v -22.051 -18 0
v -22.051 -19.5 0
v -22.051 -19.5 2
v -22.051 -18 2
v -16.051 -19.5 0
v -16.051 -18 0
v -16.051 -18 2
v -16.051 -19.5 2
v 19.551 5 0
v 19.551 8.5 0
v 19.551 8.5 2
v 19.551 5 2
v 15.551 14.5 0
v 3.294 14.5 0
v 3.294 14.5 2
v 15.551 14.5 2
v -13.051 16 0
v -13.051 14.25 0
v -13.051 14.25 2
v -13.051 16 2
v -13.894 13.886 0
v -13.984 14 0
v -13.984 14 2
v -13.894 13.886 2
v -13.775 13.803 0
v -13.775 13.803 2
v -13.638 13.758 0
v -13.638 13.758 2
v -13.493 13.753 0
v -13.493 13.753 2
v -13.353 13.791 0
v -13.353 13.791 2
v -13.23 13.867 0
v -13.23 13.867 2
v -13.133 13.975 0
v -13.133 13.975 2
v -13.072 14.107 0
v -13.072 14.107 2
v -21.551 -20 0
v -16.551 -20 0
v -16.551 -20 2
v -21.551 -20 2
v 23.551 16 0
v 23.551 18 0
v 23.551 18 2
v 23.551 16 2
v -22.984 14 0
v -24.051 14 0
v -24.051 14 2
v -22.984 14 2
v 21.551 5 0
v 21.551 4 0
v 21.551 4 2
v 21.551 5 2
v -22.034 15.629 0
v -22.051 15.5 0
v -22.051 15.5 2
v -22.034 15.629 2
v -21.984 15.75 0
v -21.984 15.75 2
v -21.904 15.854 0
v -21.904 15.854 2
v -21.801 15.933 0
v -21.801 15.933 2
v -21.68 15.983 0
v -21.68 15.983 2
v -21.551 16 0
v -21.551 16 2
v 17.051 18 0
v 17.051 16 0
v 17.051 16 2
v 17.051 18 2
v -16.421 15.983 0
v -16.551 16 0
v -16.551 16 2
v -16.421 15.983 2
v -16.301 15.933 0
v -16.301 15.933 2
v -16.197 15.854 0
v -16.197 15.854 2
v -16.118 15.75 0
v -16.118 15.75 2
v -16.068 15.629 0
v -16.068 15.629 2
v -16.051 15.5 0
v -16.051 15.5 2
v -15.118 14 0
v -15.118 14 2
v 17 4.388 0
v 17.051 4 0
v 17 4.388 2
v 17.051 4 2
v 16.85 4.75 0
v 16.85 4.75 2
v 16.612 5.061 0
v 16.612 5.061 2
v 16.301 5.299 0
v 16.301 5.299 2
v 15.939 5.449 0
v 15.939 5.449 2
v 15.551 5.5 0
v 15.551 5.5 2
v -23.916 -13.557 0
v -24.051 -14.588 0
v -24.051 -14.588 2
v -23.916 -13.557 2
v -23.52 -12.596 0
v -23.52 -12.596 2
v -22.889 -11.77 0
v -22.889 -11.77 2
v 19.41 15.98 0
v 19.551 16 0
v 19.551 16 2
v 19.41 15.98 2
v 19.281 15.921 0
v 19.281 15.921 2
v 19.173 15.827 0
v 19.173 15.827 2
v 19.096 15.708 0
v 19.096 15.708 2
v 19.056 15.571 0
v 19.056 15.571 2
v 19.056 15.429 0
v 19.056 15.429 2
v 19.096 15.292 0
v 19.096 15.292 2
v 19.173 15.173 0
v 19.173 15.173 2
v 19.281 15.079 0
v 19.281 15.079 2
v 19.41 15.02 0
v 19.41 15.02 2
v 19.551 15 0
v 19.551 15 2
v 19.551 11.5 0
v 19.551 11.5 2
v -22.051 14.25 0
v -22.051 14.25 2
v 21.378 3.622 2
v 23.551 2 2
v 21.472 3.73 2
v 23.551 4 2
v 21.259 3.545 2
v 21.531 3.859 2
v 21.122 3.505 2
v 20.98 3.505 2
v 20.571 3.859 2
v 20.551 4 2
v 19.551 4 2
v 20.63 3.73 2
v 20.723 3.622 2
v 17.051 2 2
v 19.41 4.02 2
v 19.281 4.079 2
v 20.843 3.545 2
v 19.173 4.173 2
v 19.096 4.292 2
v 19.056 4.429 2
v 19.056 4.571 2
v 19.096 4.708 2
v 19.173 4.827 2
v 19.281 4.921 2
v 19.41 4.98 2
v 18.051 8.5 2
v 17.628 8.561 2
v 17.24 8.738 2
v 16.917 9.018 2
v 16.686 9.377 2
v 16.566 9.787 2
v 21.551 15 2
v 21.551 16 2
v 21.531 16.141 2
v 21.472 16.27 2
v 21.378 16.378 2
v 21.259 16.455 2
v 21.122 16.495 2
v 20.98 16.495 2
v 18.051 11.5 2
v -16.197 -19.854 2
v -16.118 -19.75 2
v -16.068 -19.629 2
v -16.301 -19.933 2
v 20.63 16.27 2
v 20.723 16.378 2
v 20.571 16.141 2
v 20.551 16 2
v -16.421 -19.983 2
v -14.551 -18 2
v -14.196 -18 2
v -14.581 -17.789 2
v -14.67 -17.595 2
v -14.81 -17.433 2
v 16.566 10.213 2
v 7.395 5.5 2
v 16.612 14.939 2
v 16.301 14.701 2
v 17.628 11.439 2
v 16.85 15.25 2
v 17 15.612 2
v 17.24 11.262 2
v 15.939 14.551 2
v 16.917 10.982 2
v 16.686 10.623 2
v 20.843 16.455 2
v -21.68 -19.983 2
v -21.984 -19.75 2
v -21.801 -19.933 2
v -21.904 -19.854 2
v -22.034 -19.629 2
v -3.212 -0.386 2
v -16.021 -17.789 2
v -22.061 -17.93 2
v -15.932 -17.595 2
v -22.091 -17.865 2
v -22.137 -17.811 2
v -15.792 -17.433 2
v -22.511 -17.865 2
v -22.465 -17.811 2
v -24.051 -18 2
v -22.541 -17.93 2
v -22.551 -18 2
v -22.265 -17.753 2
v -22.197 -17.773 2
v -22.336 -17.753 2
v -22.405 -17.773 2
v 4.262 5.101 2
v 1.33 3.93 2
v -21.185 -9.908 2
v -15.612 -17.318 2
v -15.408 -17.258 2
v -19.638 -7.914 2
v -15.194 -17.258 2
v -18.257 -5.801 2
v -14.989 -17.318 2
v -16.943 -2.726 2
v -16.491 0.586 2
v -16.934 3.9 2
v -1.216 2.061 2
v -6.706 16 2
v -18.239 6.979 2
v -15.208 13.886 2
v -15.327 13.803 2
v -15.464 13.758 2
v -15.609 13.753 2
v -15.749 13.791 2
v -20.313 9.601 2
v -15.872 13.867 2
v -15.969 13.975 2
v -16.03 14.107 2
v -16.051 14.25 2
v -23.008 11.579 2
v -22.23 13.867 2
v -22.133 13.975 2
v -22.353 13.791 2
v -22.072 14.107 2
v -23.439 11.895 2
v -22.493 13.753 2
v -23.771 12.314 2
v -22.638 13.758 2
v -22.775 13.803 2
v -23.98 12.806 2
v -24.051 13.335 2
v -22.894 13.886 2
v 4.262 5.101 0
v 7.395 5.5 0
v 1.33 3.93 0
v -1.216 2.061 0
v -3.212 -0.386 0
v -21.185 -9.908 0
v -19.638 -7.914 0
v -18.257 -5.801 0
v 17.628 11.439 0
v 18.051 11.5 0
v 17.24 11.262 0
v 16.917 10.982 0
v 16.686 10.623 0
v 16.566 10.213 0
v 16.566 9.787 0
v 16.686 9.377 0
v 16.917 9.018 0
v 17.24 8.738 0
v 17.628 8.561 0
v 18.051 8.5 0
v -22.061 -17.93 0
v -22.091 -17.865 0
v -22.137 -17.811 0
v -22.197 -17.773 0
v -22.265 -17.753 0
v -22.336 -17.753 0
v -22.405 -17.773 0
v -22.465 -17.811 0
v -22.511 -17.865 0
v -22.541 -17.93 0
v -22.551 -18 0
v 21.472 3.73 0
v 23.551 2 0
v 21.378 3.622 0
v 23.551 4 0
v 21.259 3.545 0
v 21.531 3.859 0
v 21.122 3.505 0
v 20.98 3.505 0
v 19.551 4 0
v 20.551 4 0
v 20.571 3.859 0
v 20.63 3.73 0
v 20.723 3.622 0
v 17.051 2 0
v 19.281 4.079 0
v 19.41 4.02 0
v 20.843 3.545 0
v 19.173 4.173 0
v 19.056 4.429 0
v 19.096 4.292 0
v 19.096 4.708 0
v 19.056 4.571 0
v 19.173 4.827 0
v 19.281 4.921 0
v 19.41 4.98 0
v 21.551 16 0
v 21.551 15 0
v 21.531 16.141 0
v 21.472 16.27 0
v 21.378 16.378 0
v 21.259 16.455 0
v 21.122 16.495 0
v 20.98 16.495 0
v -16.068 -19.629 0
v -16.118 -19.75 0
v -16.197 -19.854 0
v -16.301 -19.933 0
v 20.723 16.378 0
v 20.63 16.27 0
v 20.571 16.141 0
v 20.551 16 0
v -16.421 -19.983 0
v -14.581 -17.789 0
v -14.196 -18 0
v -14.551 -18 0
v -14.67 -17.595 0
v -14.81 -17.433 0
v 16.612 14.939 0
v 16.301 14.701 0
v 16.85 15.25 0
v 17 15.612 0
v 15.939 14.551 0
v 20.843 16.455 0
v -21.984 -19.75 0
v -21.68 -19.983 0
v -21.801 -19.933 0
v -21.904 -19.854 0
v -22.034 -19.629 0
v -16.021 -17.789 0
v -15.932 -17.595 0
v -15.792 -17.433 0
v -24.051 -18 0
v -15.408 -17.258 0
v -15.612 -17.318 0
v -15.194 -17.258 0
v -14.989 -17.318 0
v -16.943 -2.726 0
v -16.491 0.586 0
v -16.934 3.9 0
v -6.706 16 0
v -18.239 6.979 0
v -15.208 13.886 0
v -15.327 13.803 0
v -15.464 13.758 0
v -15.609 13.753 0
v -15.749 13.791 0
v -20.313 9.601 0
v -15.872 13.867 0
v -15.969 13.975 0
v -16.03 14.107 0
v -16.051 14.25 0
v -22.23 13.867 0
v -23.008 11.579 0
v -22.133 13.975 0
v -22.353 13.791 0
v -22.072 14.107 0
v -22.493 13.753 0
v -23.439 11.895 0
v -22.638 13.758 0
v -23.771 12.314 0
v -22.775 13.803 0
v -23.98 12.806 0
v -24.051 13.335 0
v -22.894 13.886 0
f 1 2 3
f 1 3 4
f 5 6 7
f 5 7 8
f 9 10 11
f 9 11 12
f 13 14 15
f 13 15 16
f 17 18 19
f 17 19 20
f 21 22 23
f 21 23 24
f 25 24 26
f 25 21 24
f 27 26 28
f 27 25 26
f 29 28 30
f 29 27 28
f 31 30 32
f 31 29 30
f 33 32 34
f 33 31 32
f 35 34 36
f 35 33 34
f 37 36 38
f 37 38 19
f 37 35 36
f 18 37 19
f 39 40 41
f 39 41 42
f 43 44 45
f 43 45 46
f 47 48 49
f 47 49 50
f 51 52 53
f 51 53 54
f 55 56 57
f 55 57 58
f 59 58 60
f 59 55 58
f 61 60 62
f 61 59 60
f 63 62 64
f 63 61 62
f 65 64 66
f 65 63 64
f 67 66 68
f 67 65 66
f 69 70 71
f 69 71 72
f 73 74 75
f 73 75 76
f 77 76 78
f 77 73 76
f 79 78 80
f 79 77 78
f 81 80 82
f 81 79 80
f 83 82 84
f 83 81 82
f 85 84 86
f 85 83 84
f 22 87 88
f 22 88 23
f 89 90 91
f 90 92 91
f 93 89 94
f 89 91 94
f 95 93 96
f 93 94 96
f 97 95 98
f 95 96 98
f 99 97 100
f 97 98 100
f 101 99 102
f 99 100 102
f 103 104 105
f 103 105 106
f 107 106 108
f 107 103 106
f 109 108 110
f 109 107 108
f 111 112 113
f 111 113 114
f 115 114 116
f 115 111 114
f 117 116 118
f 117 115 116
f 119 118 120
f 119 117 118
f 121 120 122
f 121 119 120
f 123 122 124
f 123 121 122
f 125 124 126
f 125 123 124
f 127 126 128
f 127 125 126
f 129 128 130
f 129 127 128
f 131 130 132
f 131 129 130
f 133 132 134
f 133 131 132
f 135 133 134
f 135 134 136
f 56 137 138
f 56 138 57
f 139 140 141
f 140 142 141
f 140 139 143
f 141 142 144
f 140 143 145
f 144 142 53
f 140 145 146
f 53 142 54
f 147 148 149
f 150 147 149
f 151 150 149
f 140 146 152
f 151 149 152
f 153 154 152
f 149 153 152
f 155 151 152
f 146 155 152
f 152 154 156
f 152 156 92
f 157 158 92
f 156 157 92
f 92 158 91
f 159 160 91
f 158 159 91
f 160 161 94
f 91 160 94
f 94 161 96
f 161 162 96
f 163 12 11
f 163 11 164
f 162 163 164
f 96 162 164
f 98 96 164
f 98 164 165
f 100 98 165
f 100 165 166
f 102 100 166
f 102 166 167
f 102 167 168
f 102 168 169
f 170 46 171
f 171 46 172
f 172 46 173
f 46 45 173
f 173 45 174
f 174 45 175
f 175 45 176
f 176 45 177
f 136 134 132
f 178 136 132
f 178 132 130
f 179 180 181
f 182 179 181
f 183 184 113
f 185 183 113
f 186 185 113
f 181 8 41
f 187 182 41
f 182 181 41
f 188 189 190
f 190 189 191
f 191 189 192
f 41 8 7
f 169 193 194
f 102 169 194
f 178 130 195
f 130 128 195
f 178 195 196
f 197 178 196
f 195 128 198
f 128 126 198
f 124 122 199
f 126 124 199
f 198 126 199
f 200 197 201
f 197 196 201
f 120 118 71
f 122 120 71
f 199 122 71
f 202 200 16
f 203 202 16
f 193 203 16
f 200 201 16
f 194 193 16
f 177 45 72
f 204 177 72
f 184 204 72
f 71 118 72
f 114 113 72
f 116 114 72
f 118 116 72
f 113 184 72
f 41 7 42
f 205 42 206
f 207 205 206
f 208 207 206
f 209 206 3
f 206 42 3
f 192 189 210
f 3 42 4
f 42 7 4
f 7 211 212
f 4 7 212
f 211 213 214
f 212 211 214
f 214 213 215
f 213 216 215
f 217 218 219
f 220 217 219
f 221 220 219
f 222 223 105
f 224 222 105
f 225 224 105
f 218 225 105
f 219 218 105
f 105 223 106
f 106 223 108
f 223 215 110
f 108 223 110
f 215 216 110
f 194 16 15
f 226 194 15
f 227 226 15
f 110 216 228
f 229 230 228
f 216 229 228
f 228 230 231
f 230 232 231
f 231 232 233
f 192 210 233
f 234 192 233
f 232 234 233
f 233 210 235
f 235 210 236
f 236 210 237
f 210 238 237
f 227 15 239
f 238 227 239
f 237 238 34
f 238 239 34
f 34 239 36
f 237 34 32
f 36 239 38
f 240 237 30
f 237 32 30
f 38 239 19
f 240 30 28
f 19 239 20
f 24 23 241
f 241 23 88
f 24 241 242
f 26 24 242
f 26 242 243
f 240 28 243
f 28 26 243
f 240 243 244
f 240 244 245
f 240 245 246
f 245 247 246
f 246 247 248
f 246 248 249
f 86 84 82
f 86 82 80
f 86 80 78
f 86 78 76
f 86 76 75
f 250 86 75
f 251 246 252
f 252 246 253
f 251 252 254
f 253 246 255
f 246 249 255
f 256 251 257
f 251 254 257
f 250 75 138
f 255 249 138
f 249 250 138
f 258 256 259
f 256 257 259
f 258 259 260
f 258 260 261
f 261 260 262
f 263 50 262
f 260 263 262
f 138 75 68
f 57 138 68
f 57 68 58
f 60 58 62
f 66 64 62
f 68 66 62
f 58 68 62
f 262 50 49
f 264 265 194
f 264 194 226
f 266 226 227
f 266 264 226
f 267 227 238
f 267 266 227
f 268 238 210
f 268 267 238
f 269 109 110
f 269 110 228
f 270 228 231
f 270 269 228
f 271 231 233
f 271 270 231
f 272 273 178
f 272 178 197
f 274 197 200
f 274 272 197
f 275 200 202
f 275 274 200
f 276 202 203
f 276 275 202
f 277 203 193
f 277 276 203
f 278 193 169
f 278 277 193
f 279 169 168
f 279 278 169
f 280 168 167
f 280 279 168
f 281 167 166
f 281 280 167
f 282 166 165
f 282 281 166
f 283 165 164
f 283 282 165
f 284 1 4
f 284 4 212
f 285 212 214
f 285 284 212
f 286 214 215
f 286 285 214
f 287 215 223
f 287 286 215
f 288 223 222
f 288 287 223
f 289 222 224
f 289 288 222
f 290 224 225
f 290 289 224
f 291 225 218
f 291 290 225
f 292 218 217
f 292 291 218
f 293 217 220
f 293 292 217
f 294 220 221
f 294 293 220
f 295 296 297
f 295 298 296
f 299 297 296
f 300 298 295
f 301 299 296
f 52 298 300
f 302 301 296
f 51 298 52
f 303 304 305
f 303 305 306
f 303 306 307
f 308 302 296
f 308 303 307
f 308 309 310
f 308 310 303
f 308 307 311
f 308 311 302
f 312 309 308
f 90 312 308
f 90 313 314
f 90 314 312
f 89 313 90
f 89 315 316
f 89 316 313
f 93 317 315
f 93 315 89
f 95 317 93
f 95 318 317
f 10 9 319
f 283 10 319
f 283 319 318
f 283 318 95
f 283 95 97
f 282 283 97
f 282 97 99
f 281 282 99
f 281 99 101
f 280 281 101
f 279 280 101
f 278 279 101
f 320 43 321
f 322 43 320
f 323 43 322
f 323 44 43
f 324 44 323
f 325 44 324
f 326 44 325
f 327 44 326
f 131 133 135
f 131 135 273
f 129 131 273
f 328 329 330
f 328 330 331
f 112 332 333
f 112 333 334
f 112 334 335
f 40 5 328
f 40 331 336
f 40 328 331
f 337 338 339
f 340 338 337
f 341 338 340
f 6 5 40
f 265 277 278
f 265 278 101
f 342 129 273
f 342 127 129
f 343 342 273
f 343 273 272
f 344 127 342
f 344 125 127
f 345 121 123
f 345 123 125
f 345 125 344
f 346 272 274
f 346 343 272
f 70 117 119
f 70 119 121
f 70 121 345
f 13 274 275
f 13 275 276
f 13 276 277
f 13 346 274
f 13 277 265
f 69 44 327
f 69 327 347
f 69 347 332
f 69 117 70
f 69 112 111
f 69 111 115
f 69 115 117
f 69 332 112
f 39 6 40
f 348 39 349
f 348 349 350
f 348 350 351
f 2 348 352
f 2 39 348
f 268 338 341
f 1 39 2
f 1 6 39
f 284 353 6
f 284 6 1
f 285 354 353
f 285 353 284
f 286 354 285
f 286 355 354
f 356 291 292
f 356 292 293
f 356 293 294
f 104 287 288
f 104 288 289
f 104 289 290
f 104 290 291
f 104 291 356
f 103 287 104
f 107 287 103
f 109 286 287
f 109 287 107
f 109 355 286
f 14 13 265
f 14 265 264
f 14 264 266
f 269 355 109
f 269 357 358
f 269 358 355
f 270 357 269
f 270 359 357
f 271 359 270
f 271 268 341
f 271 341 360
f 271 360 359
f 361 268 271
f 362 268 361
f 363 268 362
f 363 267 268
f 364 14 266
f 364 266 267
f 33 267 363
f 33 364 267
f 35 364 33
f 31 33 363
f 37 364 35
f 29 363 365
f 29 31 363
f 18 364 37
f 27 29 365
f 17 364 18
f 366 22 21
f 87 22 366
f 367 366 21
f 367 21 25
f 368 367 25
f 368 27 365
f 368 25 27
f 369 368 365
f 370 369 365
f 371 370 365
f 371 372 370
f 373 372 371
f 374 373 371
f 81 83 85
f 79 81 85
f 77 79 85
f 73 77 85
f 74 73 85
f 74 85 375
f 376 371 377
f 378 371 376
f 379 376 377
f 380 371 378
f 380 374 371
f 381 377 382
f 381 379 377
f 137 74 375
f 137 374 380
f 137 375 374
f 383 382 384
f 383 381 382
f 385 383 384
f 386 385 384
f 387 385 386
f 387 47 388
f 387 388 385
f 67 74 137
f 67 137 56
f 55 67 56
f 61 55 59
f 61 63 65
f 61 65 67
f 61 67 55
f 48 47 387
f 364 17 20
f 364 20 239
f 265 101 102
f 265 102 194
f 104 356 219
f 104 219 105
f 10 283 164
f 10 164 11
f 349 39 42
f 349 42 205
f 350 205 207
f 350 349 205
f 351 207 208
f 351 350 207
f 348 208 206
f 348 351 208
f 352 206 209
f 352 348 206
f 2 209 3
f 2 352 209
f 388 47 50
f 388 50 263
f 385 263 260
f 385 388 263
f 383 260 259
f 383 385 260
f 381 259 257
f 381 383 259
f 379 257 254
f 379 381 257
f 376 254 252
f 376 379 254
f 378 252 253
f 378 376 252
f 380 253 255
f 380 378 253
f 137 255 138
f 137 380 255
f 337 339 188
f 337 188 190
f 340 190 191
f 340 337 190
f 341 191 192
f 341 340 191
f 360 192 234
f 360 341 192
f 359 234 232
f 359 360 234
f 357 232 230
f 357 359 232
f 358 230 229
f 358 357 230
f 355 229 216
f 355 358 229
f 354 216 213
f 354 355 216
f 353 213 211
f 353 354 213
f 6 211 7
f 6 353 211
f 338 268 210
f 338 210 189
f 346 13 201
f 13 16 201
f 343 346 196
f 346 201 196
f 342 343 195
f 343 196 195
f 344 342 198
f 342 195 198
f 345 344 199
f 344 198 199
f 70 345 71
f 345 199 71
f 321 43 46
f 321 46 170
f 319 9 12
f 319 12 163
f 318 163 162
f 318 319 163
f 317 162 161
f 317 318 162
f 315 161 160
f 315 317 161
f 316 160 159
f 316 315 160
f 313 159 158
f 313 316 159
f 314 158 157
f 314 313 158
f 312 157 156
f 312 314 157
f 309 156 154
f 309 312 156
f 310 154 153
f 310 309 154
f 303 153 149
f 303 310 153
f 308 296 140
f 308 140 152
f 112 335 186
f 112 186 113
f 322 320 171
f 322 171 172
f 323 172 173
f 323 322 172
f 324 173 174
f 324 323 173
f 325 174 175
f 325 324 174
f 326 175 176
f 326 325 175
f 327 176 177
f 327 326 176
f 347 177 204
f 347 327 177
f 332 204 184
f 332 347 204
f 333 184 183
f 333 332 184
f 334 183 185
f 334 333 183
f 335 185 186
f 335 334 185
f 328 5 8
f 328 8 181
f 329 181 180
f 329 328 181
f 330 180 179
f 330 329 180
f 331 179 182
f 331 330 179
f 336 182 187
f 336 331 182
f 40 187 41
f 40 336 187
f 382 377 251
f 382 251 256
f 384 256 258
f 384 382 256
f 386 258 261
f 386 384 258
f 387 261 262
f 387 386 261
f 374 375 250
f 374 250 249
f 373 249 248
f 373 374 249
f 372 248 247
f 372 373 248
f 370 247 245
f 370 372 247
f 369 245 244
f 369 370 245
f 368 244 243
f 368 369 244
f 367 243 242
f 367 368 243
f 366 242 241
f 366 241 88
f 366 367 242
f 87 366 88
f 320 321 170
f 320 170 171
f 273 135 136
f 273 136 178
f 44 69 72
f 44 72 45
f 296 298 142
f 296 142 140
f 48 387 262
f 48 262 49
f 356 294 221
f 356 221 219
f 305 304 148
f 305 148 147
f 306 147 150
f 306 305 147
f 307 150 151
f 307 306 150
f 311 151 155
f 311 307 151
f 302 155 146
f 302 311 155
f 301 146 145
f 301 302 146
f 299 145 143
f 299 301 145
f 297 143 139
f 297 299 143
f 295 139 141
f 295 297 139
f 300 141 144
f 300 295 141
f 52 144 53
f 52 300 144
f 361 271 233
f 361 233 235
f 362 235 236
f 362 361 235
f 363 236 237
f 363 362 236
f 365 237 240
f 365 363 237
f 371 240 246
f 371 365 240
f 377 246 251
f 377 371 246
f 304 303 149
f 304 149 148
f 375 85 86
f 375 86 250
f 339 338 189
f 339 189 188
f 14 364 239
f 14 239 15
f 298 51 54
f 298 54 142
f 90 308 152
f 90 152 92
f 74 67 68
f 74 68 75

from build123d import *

# Parameters (mm, degrees)
BOSS_EXTRUDE1_DEPTH = 2
FILLET1_R           = 1.5


with BuildPart() as part:
    # Sketch4 → Boss-Extrude1 (new body)
    with BuildSketch(Plane.XY):
        with BuildLine():
            Line((-13.050908111, 16), (-6.706499702, 16))
            Line((-6.706499702, 16), (3.293500298, 14.5))
            Line((3.293500298, 14.5), (17.050908111, 14.5))
            Line((17.050908111, 14.5), (17.050908111, 18))
            Line((17.050908111, 18), (23.550908111, 18))
            Line((23.550908111, 18), (23.550908111, 16))
            Line((23.550908111, 16), (21.550908111, 15))
            Line((21.550908111, 15), (21.550908111, 16))
            ThreePointArc((21.550908111, 16), (21.050908111, 16.5), (20.550908111, 16))
            Line((20.550908111, 16), (19.550908111, 16))
            ThreePointArc((19.550908111, 16), (19.050908111, 15.5), (19.550908111, 15))
            Line((19.550908111, 15), (19.550908111, 11.5))
            Line((19.550908111, 11.5), (18.050908111, 11.5))
            ThreePointArc((18.050908111, 11.5), (16.550908111, 10), (18.050908111, 8.5))
            Line((18.050908111, 8.5), (19.550908111, 8.5))
            Line((19.550908111, 8.5), (19.550908111, 5))
            ThreePointArc((19.550908111, 5), (19.050908111, 4.5), (19.550908111, 4))
            Line((19.550908111, 4), (20.550908111, 4))
            ThreePointArc((20.550908111, 4), (21.050908111, 3.5), (21.550908111, 4))
            Line((21.550908111, 4), (21.550908111, 5))
            Line((21.550908111, 5), (23.550908111, 4))
            Line((23.550908111, 4), (23.550908111, 2))
            Line((23.550908111, 2), (17.050908111, 2))
            Line((17.050908111, 2), (17.050908111, 5.5))
            Line((17.050908111, 5.5), (7.394672813, 5.5))
            ThreePointArc((7.394672813, 5.5), (1.329569341, 3.929982611), (-3.211963264, -0.38567682))
            Line((-3.211963264, -0.38567682), (-14.196296588, -18))
            Line((-14.196296588, -18), (-14.550908111, -18))
            ThreePointArc((-14.550908111, -18), (-15.300908111, -17.25), (-16.050908111, -18))
            Line((-16.050908111, -18), (-16.050908111, -19.5))
            ThreePointArc((-16.050908111, -19.5), (-16.197354721, -19.853553391), (-16.550908111, -20))
            Line((-16.550908111, -20), (-21.550908111, -20))
            ThreePointArc((-21.550908111, -20), (-21.904461502, -19.853553391), (-22.050908111, -19.5))
            Line((-22.050908111, -19.5), (-22.050908111, -18))
            ThreePointArc((-22.050908111, -18), (-22.300908111, -17.75), (-22.550908111, -18))
            Line((-22.550908111, -18), (-24.050908111, -18))
            Line((-24.050908111, -18), (-24.050908111, -14.588152482))
            ThreePointArc((-24.050908111, -14.588152482), (-23.749083006, -13.063848559), (-22.889156888, -11.769581233))
            ThreePointArc((-22.889156888, -11.769581233), (-20.39098235, -8.926642121), (-18.257237664, -5.800892224))
            ThreePointArc((-18.257237664, -5.800892224), (-16.93384188, 3.900322575), (-23.008225895, 11.579307131))
            ThreePointArc((-23.008225895, 11.579307131), (-23.770593485, 12.314190907), (-24.050908111, 13.335309027))
            Line((-24.050908111, 13.335309027), (-24.050908111, 14))
            Line((-24.050908111, 14), (-22.983920813, 14))
            ThreePointArc((-22.983920813, 14), (-22.421498589, 13.767037087), (-22.050908111, 14.25))
            Line((-22.050908111, 14.25), (-22.050908111, 15.5))
            ThreePointArc((-22.050908111, 15.5), (-21.904461502, 15.853553391), (-21.550908111, 16))
            Line((-21.550908111, 16), (-16.550908111, 16))
            ThreePointArc((-16.550908111, 16), (-16.197354721, 15.853553391), (-16.050908111, 15.5))
            Line((-16.050908111, 15.5), (-16.050908111, 14.25))
            ThreePointArc((-16.050908111, 14.25), (-15.680317634, 13.767037087), (-15.11789541, 14))
            Line((-15.11789541, 14), (-13.983920813, 14))
            ThreePointArc((-13.983920813, 14), (-13.421498589, 13.767037087), (-13.050908111, 14.25))
            Line((-13.050908111, 14.25), (-13.050908111, 16))
        make_face()
    extrude(amount=BOSS_EXTRUDE1_DEPTH)

    # Fillet1
    fillet1_edges = [part.edges().sort_by_distance(p)[0] for p in [
        (17.050908111, 14.5, 1),
        (17.050908111, 5.5, 1),
    ]]
    fillet(fillet1_edges, radius=FILLET1_R)


solid = part.part
